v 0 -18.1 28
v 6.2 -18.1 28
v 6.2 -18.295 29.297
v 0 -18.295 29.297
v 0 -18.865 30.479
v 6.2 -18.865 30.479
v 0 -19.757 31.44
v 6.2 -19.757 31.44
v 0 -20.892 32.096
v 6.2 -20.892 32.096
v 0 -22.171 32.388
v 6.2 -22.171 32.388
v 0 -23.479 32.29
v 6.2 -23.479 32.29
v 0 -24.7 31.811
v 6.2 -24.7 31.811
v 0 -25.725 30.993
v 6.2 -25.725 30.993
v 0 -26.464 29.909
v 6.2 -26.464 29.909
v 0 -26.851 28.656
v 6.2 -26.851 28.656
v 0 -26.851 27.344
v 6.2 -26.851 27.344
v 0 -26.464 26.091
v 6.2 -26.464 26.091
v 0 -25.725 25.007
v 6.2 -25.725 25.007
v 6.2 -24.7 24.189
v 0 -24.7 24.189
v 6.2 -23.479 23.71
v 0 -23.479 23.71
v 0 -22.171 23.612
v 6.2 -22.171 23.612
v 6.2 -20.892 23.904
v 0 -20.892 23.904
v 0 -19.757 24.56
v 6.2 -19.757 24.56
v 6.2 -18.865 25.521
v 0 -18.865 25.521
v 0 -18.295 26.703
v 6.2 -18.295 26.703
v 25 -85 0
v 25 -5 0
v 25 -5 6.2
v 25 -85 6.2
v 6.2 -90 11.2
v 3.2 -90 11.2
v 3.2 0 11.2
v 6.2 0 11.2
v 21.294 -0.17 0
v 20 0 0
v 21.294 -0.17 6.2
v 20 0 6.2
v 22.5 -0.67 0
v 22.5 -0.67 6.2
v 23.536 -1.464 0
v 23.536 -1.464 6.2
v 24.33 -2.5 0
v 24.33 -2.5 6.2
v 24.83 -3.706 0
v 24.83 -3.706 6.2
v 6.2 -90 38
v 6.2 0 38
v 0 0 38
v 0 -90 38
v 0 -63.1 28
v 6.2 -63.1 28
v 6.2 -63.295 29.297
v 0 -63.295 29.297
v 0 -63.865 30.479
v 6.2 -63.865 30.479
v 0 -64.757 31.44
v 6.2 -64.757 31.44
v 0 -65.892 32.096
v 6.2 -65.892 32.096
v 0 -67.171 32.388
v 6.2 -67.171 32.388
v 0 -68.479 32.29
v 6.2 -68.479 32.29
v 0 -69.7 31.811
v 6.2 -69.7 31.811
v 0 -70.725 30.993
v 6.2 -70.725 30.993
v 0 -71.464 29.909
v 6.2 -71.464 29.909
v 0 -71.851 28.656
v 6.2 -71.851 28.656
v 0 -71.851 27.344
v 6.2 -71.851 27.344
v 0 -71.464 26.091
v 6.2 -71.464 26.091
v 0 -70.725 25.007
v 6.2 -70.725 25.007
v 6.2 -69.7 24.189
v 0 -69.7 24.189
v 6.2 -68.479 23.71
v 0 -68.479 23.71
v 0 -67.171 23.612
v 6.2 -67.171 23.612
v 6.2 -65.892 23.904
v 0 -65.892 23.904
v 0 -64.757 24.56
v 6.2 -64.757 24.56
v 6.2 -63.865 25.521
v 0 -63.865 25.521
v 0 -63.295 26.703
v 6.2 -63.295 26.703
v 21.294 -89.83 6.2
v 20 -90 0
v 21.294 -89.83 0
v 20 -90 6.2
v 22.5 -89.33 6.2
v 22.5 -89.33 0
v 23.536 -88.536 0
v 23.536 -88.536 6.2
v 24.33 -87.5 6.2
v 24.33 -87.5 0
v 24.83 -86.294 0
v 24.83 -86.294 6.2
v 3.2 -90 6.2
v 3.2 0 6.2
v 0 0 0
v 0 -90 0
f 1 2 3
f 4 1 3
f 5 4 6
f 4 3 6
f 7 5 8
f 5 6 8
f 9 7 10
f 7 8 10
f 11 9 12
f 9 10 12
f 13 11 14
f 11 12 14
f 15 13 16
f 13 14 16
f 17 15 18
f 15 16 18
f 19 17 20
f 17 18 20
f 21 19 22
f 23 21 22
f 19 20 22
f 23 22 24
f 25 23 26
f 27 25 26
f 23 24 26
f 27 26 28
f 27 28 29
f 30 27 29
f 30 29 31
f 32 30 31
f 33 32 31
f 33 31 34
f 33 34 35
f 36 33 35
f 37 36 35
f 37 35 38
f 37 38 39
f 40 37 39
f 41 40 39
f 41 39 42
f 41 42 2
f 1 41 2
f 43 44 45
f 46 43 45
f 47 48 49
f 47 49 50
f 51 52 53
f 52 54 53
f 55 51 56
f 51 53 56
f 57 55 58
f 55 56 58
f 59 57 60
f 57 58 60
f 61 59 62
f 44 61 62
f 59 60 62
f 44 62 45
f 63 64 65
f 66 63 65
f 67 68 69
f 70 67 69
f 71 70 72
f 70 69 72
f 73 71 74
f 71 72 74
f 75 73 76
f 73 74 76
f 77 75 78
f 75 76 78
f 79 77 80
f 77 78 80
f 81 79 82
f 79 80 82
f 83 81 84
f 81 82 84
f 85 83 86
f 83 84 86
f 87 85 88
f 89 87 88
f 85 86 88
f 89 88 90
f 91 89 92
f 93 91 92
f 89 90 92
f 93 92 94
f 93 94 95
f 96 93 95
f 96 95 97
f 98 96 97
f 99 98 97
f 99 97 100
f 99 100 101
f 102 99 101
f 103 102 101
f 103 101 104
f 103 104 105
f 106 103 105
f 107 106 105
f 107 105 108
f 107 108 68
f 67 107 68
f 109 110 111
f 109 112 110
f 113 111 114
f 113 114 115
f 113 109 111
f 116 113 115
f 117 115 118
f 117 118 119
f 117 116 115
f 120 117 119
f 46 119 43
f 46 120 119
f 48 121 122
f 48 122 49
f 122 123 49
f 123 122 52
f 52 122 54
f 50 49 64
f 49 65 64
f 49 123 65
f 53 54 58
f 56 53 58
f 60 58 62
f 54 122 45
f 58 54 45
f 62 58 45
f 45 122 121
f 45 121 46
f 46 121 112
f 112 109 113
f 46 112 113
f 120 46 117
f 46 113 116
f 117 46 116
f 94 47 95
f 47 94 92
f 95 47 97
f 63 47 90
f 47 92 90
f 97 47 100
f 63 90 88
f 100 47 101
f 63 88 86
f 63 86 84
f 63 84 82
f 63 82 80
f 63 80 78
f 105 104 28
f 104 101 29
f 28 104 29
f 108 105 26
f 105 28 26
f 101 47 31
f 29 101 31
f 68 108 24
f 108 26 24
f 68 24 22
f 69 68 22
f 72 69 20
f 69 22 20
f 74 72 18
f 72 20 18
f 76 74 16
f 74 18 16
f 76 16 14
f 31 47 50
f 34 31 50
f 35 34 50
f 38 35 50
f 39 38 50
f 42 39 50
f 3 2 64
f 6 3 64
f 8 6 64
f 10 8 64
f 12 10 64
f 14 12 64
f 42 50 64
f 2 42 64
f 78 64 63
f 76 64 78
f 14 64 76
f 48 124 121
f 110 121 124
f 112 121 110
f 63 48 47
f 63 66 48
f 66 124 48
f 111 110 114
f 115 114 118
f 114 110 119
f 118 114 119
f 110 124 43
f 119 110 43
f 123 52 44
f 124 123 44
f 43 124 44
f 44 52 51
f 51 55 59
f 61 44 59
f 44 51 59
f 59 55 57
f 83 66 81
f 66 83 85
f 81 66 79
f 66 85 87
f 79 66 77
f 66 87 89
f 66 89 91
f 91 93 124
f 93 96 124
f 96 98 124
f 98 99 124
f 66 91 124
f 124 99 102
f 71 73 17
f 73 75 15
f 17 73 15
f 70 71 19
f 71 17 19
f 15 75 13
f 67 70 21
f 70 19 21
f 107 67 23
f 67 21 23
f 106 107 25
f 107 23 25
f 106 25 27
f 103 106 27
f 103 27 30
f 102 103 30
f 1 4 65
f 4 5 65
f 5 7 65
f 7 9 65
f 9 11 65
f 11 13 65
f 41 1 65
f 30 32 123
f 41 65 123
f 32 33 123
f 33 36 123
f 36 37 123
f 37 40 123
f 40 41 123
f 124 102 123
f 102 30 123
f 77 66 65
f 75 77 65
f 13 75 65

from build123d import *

# Parameters (mm, degrees)
F1_DEPTH = 90
F3_D     = 8.8
F4_R     = 5
F5_W     = 3
F5_H     = 5
F6_DEPTH = 90


with BuildPart() as f1:
    # F0 (on Front) → F1 (new body)
    with BuildSketch(Plane.XZ):
        Polygon((0, 38), (0, 0), (25, 0), (25, 6.2), (6.2, 6.2), (6.2, 38), align=None)
    extrude(amount=F1_DEPTH)

    # F3 (through all)
    with Locations(Plane(origin=(0, 0, 0), x_dir=(0, -1, 0), z_dir=(-1, 0, 0))):
        with Locations((67.5, 28), (22.5, 28)):
            Hole(F3_D / 2)

    # F4
    f4_edges = [f1.edges().sort_by_distance(p)[0] for p in [
        (25, -90, 3.1),
        (25, 0, 3.1),
    ]]
    fillet(f4_edges, radius=F4_R)

    # F5 (on face) → F6 (cut)
    with BuildSketch(Plane.XZ.offset(90)):
        with Locations((4.7, 8.7)):
            Rectangle(F5_W, F5_H)
    extrude(amount=-F6_DEPTH, mode=Mode.SUBTRACT)


solid = f1.part
